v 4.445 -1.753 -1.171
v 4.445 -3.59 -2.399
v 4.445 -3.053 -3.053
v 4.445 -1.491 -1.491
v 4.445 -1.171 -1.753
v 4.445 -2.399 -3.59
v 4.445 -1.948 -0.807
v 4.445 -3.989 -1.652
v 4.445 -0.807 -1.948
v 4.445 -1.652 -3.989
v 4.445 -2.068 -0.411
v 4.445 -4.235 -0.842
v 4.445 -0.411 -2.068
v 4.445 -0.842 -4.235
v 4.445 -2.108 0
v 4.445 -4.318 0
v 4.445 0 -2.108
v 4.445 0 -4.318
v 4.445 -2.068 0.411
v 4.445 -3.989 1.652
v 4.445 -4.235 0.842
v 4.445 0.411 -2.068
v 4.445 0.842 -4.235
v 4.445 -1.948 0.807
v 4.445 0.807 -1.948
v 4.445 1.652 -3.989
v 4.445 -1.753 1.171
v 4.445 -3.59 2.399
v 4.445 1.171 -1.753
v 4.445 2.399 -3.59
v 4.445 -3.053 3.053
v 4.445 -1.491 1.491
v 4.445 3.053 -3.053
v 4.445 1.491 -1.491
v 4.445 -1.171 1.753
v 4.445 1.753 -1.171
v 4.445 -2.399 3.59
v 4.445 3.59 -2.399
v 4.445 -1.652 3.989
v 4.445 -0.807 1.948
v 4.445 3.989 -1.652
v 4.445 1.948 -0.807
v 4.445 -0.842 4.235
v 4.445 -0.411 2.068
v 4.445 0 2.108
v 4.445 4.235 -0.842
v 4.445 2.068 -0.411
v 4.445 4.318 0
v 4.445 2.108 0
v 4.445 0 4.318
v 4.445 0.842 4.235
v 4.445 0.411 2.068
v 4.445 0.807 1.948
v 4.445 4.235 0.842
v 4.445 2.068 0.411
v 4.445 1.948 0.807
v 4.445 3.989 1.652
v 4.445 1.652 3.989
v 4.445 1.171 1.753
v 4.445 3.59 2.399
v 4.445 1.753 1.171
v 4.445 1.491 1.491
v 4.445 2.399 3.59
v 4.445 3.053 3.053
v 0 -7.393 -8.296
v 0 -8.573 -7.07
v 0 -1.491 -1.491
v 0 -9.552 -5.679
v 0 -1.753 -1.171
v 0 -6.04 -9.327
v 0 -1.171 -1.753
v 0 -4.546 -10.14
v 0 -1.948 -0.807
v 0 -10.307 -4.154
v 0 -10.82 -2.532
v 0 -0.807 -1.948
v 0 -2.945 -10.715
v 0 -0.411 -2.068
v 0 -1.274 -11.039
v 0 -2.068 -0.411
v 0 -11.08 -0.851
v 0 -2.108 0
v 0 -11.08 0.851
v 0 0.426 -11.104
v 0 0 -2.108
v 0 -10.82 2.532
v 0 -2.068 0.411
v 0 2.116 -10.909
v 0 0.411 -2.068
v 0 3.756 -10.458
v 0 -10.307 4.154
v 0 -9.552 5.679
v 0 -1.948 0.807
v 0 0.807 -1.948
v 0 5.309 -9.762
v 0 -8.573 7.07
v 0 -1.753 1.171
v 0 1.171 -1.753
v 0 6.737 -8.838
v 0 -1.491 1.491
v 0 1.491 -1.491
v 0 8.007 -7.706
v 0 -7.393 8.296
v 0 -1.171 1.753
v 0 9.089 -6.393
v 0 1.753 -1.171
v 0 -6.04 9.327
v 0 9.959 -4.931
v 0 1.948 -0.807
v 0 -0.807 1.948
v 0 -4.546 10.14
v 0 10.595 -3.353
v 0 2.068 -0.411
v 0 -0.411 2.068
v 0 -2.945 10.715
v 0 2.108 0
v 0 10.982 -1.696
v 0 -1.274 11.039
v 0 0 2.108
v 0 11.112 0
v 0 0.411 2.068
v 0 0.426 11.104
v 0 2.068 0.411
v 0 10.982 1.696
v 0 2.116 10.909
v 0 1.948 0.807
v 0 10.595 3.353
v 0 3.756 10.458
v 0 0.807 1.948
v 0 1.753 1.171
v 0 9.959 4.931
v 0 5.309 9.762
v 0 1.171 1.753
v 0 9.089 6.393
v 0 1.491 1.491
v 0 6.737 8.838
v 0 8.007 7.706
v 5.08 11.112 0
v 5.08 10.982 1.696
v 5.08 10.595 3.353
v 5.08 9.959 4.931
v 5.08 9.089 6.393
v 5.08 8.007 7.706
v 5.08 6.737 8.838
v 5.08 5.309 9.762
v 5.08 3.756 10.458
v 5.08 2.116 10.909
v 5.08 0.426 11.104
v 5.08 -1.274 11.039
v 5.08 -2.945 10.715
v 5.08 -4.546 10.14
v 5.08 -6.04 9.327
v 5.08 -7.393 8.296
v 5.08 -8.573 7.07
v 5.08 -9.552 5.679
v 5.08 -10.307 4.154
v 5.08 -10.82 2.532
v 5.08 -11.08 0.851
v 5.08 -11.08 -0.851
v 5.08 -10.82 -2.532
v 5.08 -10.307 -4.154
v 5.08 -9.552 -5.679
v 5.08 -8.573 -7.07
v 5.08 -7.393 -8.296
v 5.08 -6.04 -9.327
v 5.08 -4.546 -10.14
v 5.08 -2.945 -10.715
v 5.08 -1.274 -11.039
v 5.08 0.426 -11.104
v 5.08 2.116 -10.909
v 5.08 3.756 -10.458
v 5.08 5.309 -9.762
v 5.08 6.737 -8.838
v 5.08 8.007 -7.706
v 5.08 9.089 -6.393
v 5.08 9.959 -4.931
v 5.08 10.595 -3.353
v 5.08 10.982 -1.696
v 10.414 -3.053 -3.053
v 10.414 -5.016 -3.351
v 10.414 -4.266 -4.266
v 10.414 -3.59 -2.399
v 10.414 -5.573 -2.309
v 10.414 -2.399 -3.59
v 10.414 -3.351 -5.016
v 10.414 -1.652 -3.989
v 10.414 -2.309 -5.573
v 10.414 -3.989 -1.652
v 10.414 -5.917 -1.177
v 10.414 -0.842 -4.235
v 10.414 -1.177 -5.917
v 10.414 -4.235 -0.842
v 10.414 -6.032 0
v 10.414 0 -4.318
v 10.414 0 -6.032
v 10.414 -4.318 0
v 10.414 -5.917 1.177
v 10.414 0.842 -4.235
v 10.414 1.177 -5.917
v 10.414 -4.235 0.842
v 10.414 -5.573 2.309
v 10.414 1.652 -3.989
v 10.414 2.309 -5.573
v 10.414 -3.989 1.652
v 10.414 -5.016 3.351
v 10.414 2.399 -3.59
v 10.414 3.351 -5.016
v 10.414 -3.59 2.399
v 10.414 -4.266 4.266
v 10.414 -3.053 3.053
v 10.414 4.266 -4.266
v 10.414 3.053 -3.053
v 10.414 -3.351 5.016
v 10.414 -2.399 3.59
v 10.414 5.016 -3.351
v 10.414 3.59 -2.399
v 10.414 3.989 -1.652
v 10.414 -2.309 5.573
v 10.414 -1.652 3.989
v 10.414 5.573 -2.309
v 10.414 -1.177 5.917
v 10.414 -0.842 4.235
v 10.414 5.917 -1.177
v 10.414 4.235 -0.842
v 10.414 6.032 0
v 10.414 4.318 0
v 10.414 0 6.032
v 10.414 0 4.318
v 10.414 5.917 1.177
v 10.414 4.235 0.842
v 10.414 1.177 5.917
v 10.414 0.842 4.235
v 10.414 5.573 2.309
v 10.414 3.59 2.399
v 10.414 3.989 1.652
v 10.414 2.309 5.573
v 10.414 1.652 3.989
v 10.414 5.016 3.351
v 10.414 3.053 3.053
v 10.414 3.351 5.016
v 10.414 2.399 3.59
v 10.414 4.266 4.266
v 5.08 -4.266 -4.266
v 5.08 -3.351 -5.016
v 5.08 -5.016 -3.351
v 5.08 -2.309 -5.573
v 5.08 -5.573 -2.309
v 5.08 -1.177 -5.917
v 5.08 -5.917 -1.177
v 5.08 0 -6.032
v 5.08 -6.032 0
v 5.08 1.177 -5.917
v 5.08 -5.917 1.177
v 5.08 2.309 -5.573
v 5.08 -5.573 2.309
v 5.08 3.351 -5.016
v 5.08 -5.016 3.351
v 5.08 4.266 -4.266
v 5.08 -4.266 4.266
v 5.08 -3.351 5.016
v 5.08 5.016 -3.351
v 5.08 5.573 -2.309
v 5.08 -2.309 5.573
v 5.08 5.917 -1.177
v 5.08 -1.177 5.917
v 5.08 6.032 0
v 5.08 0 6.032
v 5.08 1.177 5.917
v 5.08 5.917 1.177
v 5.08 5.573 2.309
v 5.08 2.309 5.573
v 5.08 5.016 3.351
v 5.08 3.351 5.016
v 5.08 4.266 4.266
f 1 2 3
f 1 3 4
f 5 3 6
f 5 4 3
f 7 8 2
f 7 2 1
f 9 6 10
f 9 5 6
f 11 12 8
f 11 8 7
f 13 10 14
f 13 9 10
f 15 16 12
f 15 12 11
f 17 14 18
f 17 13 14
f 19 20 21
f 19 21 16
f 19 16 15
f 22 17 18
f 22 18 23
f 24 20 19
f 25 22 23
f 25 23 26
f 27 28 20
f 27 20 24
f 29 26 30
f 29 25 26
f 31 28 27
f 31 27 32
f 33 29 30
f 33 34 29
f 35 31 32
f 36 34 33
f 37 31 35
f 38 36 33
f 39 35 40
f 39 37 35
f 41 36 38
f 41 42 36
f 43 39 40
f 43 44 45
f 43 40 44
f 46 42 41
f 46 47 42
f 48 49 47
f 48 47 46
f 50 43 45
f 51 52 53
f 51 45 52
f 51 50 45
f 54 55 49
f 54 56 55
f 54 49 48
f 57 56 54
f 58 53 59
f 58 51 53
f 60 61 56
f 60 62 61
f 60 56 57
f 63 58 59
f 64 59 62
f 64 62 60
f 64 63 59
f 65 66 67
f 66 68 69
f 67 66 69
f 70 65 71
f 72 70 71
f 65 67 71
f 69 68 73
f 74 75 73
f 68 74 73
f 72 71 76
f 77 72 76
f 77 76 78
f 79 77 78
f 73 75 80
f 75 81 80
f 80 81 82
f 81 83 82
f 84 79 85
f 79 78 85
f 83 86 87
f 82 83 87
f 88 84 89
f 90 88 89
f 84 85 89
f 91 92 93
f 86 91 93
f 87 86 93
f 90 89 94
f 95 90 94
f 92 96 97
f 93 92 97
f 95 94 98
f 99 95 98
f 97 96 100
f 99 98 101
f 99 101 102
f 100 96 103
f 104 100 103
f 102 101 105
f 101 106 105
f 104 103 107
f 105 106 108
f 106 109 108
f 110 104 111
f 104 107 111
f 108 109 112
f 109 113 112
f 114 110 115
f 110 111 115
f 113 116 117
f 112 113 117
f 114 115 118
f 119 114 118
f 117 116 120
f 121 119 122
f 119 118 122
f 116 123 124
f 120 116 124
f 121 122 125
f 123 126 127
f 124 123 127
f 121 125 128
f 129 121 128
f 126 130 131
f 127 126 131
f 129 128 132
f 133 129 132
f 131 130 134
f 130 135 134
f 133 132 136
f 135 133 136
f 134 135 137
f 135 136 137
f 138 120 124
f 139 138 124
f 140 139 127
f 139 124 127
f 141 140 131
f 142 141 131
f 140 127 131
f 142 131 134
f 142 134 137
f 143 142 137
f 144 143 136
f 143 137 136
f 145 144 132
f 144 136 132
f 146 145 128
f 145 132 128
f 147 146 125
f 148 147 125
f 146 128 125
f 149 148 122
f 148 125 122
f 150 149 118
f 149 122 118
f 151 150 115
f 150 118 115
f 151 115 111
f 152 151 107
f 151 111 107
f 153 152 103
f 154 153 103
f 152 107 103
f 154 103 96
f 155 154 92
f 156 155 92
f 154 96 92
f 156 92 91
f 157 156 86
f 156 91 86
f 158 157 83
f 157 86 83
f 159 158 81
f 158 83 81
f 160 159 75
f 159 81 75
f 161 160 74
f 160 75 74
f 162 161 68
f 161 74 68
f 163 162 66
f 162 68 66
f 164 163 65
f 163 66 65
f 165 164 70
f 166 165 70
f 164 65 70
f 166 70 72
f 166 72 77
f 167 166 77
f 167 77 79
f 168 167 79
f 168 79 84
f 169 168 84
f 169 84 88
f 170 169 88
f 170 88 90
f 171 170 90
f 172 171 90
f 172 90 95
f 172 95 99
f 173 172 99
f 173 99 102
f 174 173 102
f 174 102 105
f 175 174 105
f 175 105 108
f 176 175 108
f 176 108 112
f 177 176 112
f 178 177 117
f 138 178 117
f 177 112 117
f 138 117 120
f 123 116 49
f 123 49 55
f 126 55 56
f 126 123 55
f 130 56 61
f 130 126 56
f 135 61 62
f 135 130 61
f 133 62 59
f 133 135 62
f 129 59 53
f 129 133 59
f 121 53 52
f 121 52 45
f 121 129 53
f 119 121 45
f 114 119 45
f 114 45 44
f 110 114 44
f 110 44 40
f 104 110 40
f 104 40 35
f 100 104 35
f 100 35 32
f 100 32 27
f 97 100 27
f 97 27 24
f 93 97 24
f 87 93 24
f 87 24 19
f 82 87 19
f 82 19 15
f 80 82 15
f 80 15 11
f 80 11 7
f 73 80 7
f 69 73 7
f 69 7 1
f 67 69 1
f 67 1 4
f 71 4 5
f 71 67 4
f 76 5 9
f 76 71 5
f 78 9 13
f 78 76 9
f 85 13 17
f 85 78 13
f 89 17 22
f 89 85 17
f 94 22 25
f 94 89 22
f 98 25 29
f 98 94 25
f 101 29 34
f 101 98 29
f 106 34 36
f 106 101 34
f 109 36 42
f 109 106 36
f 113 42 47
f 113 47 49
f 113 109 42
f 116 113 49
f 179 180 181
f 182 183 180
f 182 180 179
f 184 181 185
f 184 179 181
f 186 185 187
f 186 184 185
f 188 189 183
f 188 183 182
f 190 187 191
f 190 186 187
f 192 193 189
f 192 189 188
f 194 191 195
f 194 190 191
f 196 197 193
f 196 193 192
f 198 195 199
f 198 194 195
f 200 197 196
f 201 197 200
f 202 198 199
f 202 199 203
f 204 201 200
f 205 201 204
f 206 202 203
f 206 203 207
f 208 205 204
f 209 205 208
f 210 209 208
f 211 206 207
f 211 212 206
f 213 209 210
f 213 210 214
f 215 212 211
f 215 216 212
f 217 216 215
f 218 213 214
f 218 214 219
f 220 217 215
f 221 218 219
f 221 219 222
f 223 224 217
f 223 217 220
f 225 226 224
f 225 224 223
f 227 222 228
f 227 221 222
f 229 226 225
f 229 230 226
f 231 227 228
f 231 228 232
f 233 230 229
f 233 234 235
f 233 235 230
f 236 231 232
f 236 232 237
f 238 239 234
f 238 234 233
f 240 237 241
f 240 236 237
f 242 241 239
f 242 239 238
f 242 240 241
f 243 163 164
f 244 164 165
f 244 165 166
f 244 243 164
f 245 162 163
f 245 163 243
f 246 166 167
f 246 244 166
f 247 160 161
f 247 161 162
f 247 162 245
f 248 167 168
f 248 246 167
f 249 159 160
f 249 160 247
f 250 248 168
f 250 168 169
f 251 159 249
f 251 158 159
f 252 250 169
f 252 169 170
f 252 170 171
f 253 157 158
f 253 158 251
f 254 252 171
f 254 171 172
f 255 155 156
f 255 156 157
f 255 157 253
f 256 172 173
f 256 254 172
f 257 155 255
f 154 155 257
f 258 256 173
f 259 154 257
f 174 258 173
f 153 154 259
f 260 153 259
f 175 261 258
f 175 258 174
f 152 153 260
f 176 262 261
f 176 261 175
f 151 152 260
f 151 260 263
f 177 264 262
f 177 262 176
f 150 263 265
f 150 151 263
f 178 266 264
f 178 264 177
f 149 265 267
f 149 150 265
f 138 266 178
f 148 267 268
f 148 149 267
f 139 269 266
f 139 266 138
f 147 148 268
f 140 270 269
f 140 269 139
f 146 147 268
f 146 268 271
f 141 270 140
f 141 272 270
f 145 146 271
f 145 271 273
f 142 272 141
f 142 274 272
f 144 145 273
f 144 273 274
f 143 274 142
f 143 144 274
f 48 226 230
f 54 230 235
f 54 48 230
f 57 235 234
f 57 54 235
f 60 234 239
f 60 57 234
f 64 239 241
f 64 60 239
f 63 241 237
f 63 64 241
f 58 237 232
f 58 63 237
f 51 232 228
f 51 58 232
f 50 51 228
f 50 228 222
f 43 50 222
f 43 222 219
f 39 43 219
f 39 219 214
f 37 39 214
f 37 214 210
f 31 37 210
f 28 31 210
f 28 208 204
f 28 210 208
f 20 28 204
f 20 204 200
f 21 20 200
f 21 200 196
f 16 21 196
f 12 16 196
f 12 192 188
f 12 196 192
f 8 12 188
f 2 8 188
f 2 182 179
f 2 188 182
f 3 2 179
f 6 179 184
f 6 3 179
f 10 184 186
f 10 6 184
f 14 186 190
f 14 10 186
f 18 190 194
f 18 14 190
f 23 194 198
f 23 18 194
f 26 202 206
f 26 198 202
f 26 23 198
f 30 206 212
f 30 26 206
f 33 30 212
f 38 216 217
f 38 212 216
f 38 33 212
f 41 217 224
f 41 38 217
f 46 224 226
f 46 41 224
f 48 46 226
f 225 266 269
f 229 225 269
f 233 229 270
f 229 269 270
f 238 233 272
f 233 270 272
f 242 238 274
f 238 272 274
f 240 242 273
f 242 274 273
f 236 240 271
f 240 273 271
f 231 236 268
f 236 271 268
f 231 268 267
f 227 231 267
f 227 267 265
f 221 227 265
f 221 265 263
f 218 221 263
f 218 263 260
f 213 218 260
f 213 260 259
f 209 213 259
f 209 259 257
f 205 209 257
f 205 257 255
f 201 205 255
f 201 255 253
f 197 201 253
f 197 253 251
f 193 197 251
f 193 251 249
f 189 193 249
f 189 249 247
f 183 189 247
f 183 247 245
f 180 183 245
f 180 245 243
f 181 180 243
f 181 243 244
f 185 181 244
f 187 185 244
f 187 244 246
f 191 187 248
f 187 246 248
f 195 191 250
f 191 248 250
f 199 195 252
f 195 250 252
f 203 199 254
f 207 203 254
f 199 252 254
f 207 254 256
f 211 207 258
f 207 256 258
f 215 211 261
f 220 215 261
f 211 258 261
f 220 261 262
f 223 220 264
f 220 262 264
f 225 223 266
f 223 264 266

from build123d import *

# Parameters (mm, degrees)
F0_R     = 11.1125
F0_R_2   = 6.0325
F0_R_3   = 4.318
F0_R_4   = 2.1082
F1_DEPTH = 5.08
F2_DEPTH = 10.414
F3_START = 4.445
F3_DEPTH = 8.255


with BuildPart() as f1:
    # F0 (on Right) → F1 (new body)
    with BuildSketch(Plane.YZ):
        Circle(F0_R)
        Circle(F0_R_2, mode=Mode.SUBTRACT)
        Circle(F0_R_2)
        Circle(F0_R_3, mode=Mode.SUBTRACT)
        Circle(F0_R_3)
        Circle(F0_R_4, mode=Mode.SUBTRACT)
    extrude(amount=F1_DEPTH)

    # F0 (on Right) → F2 (join)
    with BuildSketch(Plane.YZ):
        Circle(F0_R_2)
        Circle(F0_R_3, mode=Mode.SUBTRACT)
        Circle(F0_R_3)
        Circle(F0_R_4, mode=Mode.SUBTRACT)
    extrude(amount=F2_DEPTH)

    # F0 (on Right) → F3 (cut)
    with BuildSketch(Plane.YZ.offset(F3_START)):
        Circle(F0_R_3)
        Circle(F0_R_4, mode=Mode.SUBTRACT)
    extrude(amount=F3_DEPTH, mode=Mode.SUBTRACT)


solid = f1.part
